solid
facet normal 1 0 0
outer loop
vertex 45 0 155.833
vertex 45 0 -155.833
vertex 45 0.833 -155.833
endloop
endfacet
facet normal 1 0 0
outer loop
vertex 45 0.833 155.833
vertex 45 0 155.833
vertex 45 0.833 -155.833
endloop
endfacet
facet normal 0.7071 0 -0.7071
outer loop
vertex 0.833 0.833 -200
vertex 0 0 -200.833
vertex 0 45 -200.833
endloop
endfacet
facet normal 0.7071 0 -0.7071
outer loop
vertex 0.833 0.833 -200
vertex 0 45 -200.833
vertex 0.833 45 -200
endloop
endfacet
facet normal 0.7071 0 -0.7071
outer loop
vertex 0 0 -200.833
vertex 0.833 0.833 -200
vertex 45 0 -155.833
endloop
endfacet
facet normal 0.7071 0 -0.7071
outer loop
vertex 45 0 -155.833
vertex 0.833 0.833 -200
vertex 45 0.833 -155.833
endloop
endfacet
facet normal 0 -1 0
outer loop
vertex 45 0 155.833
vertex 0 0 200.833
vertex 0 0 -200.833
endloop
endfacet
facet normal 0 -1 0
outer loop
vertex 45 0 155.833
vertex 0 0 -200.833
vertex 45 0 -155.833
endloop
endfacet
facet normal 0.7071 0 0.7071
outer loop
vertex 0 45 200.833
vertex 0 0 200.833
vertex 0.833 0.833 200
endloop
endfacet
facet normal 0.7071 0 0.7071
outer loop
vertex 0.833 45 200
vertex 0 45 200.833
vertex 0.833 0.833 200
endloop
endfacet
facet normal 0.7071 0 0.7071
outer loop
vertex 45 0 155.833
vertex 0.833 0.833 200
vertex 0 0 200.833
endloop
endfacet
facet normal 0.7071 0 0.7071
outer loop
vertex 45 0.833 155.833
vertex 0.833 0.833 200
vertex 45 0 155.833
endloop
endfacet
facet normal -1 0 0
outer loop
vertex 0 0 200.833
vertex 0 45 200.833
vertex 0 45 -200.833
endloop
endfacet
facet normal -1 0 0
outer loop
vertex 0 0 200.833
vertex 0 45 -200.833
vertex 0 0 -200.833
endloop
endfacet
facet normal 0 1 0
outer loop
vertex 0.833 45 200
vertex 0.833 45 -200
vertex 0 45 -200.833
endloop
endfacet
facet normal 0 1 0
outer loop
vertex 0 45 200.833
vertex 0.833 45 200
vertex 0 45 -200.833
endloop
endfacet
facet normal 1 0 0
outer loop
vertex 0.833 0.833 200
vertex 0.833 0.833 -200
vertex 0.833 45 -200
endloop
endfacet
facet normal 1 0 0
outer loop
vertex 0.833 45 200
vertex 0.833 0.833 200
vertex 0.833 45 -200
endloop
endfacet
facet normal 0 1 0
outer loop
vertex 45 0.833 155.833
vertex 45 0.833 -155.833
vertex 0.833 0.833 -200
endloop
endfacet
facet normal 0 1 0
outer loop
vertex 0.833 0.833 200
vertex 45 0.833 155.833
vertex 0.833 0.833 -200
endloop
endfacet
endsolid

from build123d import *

# Parameters (mm, degrees)
BOSS_EXTRUDE1_DEPTH = 210


with BuildPart() as part:
    # Sketch1 → Boss-Extrude1 (new, symmetric)
    with BuildSketch(Plane.XY):
        Polygon((0, 45), (0, 0), (45, 0), (45, 0.833333333), (0.833333333, 0.833333333), (0.833333333, 45), align=None)
    extrude(amount=BOSS_EXTRUDE1_DEPTH, both=True)

    # SurfaceCut5
    split(bisect_by=Plane(origin=(100.416666667, 0, -100.416666667), x_dir=(0.7071067811865487, 0, 0.7071067811865465), z_dir=(-0.7071067811865465, 0, 0.7071067811865487)), keep=Keep.TOP)

    # SurfaceCut6
    split(bisect_by=Plane(origin=(100.416666667, 0, 100.416666667), x_dir=(0.7071067811865487, 0, -0.7071067811865465), z_dir=(0.7071067811865465, 0, 0.7071067811865487)), keep=Keep.BOTTOM)


solid = part.part
